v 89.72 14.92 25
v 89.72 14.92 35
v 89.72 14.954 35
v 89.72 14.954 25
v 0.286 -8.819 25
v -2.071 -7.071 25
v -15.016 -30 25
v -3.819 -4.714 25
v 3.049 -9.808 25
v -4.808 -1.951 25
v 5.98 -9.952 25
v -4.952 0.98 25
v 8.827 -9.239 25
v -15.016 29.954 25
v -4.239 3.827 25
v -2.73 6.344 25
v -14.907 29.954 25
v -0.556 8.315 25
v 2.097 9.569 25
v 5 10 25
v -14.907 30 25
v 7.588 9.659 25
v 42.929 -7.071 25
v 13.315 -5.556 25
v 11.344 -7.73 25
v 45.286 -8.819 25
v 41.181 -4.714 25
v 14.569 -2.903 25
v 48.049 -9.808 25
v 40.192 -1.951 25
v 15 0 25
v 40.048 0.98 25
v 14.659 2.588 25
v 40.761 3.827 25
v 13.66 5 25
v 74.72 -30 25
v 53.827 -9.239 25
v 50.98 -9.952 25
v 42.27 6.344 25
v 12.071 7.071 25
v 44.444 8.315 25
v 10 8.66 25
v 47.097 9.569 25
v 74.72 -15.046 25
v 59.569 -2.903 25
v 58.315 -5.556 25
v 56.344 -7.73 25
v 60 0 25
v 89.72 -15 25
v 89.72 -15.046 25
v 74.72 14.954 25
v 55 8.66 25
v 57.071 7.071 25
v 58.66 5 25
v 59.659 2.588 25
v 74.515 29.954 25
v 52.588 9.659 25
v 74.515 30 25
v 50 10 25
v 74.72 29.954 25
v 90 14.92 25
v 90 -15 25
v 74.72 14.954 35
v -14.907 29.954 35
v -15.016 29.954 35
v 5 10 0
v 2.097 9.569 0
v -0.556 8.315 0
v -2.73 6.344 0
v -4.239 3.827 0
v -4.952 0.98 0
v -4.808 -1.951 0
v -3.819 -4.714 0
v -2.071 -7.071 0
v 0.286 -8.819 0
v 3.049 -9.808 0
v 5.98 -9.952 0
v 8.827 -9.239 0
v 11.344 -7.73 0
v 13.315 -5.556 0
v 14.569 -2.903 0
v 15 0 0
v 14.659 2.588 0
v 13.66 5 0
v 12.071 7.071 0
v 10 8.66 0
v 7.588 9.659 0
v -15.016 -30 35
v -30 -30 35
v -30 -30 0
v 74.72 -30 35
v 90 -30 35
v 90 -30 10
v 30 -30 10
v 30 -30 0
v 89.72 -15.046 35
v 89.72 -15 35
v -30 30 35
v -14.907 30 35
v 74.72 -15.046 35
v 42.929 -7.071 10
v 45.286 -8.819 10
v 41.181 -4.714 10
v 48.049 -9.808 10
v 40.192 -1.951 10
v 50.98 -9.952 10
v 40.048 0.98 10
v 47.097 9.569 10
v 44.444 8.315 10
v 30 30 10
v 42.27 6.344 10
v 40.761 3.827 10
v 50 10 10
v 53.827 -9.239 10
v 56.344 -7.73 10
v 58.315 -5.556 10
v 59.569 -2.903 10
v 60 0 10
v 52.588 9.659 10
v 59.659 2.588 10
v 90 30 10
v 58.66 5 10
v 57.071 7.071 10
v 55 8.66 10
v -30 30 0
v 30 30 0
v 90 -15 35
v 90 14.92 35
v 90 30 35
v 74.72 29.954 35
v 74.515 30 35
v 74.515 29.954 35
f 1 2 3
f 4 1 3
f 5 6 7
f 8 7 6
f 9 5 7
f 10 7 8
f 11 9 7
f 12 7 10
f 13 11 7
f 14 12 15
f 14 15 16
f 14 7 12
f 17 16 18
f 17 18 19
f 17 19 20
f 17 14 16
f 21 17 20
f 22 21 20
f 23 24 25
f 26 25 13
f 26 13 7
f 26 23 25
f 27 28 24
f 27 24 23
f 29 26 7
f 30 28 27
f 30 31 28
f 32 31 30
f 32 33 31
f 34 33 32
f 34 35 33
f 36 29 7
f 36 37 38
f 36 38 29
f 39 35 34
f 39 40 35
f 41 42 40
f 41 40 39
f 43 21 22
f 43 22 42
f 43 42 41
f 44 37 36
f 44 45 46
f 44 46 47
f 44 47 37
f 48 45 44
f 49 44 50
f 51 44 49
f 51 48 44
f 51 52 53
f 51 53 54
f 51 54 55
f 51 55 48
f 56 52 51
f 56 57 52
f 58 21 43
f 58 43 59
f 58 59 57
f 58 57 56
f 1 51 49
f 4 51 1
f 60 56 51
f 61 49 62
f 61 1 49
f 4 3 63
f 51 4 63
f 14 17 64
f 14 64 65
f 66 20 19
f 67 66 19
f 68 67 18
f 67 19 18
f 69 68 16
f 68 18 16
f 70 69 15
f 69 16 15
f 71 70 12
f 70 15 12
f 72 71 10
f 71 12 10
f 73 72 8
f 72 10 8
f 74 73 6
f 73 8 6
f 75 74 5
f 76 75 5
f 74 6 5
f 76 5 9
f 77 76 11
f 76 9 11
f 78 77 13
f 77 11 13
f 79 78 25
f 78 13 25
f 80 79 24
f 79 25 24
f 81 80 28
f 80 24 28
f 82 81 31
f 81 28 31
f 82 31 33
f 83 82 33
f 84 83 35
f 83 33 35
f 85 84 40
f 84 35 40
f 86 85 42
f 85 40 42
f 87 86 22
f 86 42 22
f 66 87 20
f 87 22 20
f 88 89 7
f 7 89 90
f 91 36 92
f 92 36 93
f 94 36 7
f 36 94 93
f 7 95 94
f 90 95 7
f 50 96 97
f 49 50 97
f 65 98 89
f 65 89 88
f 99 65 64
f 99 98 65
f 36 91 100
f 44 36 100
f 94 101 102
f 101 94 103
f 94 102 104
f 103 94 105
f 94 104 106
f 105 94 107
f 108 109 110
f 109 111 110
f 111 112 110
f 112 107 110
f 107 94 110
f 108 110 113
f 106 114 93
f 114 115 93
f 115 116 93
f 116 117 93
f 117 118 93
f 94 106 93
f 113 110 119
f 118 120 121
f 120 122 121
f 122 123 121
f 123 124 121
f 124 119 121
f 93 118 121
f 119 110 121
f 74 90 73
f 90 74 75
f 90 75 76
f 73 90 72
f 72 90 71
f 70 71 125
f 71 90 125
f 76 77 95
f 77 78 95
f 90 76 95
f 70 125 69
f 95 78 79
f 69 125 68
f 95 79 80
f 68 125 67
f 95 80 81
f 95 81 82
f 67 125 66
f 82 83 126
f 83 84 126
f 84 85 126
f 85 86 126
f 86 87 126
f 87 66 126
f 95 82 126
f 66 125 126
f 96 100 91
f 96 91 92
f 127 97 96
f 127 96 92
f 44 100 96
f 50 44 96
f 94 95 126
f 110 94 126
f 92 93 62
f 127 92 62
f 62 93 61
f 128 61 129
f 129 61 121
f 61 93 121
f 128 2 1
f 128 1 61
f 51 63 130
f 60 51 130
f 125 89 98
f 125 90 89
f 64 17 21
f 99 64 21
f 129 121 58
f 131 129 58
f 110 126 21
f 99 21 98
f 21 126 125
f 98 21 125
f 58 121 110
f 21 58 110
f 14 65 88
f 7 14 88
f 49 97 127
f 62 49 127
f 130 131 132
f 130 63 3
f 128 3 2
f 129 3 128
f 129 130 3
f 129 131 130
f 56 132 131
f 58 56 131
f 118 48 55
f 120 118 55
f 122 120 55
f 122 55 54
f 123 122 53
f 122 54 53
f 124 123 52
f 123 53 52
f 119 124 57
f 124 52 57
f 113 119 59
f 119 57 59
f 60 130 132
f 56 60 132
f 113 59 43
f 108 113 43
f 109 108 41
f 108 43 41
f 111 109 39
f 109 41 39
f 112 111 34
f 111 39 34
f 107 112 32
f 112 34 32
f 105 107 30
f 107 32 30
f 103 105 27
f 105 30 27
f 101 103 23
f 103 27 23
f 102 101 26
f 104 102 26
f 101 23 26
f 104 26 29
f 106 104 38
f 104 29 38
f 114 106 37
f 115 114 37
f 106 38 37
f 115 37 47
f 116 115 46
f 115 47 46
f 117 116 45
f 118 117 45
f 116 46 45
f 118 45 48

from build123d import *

# Parameters (mm, degrees)
F0_W      = 60
F0_H      = 60
F1_DEPTH  = 10
F2_W      = 60
F2_H      = 60
F3_DEPTH  = 25
F5_DEPTH  = 51.5
F7_DEPTH  = 10
F8_W      = 19.9074504152
F8_H      = 1.7359393835
F8_W_2    = 45
F8_W_3    = 24.514567852
F9_DEPTH  = 10
F10_W     = 2.977065742
F10_H     = 29.9195116386
F11_DEPTH = 10


with BuildPart() as f1:
    # F0 (on Top) → F1 (new body)
    with BuildSketch(Plane.XY):
        Rectangle(F0_W, F0_H)
    extrude(amount=F1_DEPTH)

    # F2 (on face) → F3 (join)
    with BuildSketch(Plane.XY.offset(10)):
        Rectangle(F2_W, F2_H)
        with Locations((60, 0)):
            Rectangle(F2_W, F2_H)
    extrude(amount=F3_DEPTH)

    # F4 (on face) → F5 (cut)
    with BuildSketch(Plane.XY.offset(35)):
        with BuildLine():
            ThreePointArc((60, 0), (57.0710678119, 7.0710678119), (50, 10))
            ThreePointArc((50, 10), (42.9289321881, -7.0710678119), (60, 0))
        make_face()
        with BuildLine():
            ThreePointArc((15, 0), (12.0710678119, 7.0710678119), (5, 10))
            ThreePointArc((5, 10), (-2.0710678119, -7.0710678119), (15, 0))
        make_face()
    extrude(amount=-F5_DEPTH, mode=Mode.SUBTRACT)

    # F6 (on face) → F7 (cut)
    with BuildSketch(Plane.XY.offset(35)):
        Polygon((5, 29.9537748588), (-15.0160359405, 29.9537740648), (-15.0160359405, -30), (74.7204658659, -30), (74.7204658659, -15.0462223754), (89.7204658659, -15.0462223754), (89.7204658659, 14.9537776246), (74.7204658659, 14.9537776246), (74.7204658659, 29.9537776246), (50, 29.953776644), align=None)
        with BuildLine():
            ThreePointArc((15, 0), (-2.0710678119, -7.0710678119), (5, 10))
            ThreePointArc((5, 10), (12.0710678119, 7.0710678119), (15, 0))
        make_face(mode=Mode.SUBTRACT)
        with BuildLine():
            ThreePointArc((60, 0), (42.9289321881, -7.0710678119), (50, 10))
            ThreePointArc((50, 10), (57.0710678119, 7.0710678119), (60, 0))
        make_face(mode=Mode.SUBTRACT)
    extrude(amount=-F7_DEPTH, mode=Mode.SUBTRACT)

    # F8 (on face) → F9 (cut)
    with BuildSketch(Plane.XY.offset(35)):
        with Locations((-4.9537252076, 29.1320303082)):
            Rectangle(F8_W, F8_H)
        with Locations((27.5, 29.1320303082)):
            Rectangle(F8_W_2, F8_H)
        with Locations((62.257283926, 29.1320303082)):
            Rectangle(F8_W_3, F8_H)
    extrude(amount=-F9_DEPTH, mode=Mode.SUBTRACT)

    # F10 (on face) → F11 (cut)
    with BuildSketch(Plane.XY.offset(35)):
        with Locations((91.1140106618, -0.0397800468)):
            Rectangle(F10_W, F10_H)
    extrude(amount=-F11_DEPTH, mode=Mode.SUBTRACT)


solid = f1.part
